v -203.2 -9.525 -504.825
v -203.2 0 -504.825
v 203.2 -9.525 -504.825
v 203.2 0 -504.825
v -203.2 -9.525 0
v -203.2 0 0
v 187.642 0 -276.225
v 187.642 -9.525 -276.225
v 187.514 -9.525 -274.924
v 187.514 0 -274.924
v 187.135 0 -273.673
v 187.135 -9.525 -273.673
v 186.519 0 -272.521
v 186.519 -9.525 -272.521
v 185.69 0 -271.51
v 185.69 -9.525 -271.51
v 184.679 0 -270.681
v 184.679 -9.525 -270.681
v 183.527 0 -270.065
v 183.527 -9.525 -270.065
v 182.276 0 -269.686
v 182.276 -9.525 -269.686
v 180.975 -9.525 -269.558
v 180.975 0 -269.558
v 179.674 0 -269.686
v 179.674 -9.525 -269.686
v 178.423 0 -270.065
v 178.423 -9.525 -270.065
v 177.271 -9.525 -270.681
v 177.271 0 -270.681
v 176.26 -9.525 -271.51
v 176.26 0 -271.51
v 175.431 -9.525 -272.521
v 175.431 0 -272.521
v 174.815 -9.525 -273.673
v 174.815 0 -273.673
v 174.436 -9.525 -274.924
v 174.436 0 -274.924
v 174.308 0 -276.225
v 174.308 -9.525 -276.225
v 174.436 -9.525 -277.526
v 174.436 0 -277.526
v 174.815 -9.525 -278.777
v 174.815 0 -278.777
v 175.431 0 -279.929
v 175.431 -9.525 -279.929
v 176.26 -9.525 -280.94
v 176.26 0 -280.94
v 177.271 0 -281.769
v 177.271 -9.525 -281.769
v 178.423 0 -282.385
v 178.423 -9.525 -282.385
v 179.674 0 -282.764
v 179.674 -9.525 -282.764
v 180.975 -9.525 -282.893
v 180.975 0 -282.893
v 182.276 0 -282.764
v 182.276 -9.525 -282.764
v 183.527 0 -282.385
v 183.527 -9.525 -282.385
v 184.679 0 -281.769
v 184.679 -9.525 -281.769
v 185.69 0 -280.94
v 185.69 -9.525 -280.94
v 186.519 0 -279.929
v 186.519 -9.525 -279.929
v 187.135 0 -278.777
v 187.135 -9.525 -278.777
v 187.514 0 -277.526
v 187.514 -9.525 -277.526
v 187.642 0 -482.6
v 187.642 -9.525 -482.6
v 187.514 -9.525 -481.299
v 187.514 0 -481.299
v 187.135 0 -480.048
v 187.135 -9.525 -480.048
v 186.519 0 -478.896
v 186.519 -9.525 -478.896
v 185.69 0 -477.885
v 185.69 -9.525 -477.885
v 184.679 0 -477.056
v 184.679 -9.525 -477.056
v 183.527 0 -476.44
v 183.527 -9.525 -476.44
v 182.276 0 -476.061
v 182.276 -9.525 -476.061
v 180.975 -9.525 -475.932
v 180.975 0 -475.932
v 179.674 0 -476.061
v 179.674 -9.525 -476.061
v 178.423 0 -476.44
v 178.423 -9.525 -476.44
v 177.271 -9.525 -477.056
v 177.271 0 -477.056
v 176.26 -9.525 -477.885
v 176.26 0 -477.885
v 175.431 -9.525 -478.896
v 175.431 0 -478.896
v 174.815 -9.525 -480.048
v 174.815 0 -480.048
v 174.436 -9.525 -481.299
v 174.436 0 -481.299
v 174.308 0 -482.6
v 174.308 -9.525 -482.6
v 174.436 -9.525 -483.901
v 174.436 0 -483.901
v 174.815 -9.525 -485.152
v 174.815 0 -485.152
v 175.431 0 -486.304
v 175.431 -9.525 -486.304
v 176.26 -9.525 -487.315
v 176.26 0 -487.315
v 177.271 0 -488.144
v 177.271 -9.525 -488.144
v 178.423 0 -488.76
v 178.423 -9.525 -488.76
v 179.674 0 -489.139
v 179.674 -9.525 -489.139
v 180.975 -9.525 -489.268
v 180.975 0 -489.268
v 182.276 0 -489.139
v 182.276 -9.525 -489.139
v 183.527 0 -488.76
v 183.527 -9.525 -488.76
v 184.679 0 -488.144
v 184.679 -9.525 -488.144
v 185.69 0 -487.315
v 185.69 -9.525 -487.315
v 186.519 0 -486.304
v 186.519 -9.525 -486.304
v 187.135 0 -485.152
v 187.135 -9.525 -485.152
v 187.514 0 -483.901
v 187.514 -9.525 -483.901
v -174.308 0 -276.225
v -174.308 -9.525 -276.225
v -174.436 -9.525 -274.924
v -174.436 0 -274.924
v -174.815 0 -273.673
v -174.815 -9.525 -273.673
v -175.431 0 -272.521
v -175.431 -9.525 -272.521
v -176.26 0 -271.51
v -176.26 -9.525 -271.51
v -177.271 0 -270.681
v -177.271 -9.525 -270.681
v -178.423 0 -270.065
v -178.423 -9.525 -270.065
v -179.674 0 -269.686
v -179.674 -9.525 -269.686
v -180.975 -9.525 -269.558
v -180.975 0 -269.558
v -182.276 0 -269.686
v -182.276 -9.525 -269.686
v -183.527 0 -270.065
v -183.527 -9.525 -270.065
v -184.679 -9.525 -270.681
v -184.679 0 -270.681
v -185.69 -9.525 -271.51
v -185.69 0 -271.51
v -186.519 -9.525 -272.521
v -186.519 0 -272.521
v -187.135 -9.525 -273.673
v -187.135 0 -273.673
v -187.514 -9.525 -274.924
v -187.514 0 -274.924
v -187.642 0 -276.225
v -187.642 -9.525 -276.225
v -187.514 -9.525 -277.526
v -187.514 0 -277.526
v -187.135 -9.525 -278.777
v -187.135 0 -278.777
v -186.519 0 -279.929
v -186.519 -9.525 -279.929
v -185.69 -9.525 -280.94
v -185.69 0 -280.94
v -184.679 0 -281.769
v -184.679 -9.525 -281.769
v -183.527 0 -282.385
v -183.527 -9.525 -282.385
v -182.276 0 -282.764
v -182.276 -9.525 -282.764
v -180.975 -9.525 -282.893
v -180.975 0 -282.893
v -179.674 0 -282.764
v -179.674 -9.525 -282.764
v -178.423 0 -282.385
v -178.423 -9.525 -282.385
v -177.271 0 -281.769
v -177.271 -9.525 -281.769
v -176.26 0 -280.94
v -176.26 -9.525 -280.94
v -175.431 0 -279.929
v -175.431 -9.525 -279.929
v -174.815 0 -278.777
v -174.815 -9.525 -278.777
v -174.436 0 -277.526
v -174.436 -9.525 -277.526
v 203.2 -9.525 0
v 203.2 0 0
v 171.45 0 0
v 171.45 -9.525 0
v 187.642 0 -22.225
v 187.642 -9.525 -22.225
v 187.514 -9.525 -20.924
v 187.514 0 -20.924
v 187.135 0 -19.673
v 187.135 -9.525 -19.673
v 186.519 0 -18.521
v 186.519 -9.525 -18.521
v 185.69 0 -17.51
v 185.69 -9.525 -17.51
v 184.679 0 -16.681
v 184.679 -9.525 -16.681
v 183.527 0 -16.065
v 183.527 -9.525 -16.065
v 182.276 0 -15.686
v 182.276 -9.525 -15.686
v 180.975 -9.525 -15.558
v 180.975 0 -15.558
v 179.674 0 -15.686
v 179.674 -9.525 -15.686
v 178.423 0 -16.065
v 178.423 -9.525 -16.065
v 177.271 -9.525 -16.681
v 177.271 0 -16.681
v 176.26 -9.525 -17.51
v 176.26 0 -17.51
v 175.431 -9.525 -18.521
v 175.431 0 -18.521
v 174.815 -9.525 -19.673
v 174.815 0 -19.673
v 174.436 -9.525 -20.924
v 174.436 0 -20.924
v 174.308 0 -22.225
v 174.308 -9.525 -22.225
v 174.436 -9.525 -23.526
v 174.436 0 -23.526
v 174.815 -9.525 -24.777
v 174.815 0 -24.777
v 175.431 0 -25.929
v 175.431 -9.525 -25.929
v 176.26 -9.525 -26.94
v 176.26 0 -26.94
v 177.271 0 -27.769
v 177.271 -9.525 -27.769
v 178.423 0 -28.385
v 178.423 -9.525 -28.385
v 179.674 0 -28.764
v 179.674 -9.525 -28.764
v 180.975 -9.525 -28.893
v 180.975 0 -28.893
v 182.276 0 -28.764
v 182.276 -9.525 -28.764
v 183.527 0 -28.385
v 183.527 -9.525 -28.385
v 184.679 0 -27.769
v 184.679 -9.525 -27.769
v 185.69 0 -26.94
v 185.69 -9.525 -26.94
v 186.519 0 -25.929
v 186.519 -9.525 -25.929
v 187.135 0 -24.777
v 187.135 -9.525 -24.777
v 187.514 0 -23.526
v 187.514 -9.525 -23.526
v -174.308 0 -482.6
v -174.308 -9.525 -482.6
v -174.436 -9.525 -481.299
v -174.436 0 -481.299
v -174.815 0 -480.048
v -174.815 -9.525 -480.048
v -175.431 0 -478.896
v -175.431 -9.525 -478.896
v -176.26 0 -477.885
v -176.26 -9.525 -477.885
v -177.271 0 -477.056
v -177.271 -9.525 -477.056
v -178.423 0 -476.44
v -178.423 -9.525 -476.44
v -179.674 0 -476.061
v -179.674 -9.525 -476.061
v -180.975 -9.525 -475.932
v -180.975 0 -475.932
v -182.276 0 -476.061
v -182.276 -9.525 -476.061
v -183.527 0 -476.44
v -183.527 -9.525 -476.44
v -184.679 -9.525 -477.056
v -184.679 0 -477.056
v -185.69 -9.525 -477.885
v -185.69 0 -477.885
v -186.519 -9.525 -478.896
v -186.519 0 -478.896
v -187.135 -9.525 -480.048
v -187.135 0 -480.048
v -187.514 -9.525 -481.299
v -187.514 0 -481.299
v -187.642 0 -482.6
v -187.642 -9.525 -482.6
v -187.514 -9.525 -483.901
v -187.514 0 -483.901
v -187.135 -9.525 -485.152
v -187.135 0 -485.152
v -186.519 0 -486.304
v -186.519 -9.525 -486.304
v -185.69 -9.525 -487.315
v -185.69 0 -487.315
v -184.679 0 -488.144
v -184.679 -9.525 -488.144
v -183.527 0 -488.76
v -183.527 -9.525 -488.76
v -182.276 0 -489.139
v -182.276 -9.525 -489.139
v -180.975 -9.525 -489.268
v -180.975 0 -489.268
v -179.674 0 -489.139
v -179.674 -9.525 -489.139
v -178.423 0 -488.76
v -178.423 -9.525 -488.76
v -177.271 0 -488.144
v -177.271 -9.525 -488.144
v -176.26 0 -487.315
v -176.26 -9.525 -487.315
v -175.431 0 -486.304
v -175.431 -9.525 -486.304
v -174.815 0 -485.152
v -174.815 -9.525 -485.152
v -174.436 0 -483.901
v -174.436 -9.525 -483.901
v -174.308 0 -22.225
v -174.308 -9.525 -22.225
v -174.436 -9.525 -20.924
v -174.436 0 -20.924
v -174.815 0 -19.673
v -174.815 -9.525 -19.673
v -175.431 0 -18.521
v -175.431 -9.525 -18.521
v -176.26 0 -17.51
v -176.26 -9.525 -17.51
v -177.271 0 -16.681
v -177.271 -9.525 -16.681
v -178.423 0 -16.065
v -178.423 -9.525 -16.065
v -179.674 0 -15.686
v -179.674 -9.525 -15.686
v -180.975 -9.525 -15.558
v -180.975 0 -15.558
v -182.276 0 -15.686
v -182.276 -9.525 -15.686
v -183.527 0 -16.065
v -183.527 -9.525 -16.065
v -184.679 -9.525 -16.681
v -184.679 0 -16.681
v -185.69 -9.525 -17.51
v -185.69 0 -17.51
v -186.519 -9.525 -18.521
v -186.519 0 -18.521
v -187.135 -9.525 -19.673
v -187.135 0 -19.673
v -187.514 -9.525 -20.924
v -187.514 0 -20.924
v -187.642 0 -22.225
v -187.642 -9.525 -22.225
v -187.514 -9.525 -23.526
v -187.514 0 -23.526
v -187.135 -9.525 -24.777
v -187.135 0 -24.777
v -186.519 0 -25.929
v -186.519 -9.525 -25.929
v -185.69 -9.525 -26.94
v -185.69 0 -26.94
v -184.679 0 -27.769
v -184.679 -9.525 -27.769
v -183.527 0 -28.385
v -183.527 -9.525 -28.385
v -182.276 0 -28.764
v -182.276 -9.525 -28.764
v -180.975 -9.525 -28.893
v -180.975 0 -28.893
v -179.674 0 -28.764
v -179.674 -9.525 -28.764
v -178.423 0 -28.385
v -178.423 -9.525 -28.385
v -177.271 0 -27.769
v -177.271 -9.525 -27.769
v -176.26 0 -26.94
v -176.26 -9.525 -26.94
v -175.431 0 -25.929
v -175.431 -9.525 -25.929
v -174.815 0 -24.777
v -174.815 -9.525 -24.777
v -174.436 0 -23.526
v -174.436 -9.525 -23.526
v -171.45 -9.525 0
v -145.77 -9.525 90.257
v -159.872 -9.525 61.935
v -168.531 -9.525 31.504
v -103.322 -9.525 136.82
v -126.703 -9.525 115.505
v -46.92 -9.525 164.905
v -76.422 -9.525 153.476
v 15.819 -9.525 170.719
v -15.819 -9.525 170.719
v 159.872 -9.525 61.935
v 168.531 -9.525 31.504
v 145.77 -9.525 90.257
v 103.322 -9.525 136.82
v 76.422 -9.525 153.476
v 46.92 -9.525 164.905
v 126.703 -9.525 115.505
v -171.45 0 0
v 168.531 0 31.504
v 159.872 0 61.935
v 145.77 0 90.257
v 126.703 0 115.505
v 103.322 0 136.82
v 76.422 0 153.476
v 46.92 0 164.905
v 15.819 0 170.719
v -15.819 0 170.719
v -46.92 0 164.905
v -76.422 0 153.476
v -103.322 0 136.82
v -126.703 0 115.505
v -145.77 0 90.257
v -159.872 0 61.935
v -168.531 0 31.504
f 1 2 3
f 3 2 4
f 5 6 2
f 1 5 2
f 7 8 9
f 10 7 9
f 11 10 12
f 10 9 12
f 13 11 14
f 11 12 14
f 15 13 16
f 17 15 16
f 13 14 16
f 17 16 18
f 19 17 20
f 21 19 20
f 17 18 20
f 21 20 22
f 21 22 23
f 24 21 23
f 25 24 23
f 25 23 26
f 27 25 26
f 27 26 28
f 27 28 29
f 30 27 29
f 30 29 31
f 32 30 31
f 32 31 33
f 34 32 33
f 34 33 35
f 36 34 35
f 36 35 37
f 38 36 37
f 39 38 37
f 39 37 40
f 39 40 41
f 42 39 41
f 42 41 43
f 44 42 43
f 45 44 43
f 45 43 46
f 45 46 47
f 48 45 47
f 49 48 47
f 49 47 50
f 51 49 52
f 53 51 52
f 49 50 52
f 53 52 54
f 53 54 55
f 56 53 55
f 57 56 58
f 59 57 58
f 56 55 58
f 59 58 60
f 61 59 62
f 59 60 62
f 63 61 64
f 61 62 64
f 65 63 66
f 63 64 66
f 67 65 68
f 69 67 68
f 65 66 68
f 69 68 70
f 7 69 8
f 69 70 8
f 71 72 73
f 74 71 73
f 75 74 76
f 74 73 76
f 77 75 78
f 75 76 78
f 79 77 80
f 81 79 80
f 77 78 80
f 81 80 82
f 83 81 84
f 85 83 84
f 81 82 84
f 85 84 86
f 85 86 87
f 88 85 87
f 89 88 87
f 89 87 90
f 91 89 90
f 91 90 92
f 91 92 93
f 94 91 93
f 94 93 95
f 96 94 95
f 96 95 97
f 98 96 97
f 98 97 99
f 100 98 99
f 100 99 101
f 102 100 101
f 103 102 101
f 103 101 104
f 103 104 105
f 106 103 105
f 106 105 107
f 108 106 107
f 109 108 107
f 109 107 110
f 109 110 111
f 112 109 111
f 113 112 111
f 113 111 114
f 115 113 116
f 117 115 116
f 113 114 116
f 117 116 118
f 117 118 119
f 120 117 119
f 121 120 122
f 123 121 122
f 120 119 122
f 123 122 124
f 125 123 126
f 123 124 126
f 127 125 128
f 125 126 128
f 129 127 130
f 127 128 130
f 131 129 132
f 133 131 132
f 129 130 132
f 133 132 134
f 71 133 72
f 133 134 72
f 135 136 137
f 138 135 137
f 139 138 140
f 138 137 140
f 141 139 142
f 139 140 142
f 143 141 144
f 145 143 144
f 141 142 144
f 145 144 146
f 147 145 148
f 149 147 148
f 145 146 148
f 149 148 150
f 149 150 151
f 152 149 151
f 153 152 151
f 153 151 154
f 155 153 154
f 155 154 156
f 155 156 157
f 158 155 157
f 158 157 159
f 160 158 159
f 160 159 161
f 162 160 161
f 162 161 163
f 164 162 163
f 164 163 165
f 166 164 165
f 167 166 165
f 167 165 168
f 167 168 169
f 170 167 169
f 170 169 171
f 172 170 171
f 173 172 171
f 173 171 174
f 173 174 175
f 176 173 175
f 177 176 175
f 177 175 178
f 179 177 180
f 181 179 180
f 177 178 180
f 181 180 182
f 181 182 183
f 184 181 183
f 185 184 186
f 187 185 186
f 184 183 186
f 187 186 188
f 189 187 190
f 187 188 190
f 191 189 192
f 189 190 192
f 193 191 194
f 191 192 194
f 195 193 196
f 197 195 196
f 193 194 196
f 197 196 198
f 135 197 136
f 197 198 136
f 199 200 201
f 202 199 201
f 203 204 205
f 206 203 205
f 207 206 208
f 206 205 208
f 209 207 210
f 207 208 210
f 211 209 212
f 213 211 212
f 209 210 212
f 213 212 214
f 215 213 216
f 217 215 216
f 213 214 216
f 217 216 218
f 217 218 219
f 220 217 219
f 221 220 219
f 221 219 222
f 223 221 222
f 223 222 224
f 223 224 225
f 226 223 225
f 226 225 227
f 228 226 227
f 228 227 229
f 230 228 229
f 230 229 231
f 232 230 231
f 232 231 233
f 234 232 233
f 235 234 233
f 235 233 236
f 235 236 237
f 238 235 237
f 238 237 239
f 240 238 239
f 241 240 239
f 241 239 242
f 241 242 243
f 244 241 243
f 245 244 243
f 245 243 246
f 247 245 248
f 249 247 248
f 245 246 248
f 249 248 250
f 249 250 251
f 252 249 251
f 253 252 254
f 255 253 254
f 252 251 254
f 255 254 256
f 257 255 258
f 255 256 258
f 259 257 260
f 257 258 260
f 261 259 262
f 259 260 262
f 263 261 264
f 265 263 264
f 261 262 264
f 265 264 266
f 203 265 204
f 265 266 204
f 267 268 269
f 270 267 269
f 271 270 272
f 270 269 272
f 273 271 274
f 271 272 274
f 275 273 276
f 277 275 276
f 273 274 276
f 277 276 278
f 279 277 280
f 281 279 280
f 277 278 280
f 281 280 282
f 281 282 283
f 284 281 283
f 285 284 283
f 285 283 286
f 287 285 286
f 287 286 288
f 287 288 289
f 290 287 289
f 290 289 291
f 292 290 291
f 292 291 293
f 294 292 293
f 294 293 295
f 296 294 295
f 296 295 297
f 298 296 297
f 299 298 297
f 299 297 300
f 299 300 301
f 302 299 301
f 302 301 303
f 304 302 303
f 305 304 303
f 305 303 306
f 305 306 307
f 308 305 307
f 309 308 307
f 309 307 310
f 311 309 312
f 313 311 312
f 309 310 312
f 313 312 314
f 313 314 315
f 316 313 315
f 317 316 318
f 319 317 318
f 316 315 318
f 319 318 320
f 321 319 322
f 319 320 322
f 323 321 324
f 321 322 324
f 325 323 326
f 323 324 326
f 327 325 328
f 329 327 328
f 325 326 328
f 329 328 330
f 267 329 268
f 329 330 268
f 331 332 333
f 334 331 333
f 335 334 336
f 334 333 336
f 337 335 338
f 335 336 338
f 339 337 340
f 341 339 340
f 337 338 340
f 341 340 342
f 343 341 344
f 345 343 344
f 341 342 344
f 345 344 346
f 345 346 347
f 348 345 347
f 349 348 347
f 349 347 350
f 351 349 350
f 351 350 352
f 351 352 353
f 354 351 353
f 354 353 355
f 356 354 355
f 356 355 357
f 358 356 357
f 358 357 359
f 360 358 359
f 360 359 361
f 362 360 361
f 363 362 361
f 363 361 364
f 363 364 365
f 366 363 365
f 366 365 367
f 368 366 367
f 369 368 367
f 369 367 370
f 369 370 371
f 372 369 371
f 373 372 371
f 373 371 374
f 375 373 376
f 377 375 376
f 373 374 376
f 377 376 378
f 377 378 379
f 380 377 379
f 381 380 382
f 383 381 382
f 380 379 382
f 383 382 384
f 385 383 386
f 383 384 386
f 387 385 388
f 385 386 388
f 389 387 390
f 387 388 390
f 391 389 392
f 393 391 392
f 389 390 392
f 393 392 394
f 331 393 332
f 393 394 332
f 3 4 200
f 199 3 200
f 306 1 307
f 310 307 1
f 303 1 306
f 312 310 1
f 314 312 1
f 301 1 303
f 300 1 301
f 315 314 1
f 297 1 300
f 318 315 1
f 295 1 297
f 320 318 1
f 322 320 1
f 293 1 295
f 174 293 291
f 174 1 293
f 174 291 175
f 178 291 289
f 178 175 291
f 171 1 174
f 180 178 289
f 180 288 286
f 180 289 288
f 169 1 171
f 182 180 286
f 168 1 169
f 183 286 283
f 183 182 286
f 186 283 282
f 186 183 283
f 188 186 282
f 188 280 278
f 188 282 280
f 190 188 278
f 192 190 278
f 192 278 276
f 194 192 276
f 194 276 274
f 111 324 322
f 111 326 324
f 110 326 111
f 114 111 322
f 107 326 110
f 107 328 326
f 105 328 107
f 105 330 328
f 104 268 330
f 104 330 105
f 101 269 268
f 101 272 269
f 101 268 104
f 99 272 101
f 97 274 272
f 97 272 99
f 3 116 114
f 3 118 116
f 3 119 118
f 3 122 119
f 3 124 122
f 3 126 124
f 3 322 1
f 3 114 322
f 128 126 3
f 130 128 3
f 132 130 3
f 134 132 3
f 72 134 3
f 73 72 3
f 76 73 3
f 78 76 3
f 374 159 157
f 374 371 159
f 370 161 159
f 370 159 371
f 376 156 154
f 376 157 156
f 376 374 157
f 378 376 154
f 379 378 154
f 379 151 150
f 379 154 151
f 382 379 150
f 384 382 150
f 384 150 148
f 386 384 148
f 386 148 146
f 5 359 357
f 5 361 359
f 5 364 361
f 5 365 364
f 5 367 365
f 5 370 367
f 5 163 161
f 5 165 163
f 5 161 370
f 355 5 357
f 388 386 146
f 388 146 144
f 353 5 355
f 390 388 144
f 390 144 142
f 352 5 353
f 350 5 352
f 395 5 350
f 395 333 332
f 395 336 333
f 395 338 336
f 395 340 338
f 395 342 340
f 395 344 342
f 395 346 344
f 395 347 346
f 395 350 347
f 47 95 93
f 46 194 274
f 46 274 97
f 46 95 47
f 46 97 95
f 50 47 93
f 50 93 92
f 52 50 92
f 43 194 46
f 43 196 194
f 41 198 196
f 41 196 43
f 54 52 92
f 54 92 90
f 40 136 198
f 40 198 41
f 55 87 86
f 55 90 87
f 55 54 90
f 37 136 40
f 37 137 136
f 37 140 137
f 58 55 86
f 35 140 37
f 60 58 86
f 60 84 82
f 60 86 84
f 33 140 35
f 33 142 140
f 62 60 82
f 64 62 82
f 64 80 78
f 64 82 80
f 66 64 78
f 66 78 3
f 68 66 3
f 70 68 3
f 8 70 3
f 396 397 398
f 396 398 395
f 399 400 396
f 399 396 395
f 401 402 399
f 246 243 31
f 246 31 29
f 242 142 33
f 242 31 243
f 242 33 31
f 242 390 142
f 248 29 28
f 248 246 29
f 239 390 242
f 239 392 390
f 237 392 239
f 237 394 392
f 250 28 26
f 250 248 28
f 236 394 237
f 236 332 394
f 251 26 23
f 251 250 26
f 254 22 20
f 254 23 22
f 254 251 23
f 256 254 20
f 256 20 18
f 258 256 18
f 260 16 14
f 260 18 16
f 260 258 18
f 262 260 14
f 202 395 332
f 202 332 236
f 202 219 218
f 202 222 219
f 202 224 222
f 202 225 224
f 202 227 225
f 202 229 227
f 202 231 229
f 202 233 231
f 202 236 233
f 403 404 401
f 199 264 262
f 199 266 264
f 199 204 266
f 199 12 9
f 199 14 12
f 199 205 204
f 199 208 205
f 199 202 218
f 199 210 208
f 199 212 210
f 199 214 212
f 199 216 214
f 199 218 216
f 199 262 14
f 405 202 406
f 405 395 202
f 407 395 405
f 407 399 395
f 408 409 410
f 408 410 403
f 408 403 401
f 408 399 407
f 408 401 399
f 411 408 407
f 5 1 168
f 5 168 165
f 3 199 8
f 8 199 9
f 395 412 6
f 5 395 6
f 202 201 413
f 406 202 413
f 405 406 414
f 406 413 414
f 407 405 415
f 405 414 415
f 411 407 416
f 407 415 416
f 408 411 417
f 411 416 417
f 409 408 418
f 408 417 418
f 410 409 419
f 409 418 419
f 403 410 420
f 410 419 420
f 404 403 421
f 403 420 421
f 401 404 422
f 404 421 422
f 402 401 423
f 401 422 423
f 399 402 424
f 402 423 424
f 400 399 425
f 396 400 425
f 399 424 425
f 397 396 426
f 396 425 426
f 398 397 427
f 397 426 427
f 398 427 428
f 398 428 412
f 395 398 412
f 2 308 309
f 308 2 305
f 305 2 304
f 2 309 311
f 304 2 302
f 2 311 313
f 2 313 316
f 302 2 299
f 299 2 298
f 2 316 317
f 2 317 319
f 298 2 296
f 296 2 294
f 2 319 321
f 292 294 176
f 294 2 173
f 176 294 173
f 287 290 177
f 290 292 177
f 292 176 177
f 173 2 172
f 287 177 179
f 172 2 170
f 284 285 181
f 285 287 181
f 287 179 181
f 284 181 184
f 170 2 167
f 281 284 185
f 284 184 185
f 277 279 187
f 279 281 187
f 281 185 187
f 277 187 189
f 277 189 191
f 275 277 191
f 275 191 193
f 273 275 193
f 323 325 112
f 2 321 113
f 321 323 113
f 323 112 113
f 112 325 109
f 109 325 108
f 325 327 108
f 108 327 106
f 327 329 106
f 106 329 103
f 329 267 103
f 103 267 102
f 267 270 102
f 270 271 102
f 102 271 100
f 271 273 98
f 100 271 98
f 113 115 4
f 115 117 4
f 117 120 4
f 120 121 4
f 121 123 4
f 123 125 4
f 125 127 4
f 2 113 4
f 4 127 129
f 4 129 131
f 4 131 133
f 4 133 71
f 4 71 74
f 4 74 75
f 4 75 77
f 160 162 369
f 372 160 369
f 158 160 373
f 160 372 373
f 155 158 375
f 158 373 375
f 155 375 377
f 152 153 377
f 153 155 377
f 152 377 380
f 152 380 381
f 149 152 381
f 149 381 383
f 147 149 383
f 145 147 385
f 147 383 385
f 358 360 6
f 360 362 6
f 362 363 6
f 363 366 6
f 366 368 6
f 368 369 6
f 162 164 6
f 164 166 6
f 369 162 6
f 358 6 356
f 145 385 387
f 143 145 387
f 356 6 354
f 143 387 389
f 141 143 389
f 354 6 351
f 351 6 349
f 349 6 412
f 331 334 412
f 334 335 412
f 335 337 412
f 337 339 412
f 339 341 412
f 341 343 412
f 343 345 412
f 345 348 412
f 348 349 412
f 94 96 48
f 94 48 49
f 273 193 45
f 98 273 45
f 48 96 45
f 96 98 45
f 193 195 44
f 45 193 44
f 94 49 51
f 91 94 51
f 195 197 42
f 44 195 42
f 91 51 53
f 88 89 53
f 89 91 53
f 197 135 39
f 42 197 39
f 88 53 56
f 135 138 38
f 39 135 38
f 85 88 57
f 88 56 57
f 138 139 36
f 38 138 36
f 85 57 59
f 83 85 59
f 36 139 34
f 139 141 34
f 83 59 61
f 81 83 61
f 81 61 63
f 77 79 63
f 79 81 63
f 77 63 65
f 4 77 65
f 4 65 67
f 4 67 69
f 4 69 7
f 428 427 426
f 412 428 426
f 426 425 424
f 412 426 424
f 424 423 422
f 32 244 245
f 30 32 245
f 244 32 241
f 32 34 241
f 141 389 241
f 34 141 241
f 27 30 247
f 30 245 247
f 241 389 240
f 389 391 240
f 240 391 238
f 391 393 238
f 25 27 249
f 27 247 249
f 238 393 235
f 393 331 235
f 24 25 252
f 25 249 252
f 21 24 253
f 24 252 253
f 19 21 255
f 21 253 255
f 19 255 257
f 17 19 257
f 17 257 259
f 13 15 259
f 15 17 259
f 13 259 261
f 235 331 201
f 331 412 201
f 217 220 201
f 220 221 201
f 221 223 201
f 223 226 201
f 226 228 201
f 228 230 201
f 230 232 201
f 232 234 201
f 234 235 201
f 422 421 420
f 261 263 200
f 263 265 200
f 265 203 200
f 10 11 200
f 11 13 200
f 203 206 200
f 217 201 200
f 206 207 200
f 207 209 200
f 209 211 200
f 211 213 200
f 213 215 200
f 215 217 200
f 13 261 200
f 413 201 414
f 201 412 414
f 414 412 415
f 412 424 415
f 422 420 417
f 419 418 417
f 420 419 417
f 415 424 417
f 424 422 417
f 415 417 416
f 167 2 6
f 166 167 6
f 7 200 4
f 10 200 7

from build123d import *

# Parameters (mm, degrees)
F1_DEPTH = 9.525
F2_R     = 6.6675
F3_DEPTH = 9.526


with BuildPart() as f1:
    # F0 (on Front) → F1 (new body)
    with BuildSketch(Plane.XZ):
        with BuildLine():
            Line((203.2, 0), (171.45, 0))
            ThreePointArc((171.45, 0), (0, 171.45), (-171.45, 0))
            Line((-171.45, 0), (-203.2, 0))
            Line((-203.2, 0), (-203.2, -504.825))
            Line((-203.2, -504.825), (203.2, -504.825))
            Line((203.2, -504.825), (203.2, 0))
        make_face()
    extrude(amount=F1_DEPTH)

    # F2 (on face) → F3 (cut, through all)
    with BuildSketch(Plane.XZ.offset(9.525)):
        with Locations((-180.975, -22.225)):
            Circle(F2_R)
        with Locations((180.975, -22.225)):
            Circle(F2_R)
        with Locations((180.975, -276.225)):
            Circle(F2_R)
        with Locations((-180.975, -276.225)):
            Circle(F2_R)
        with Locations((180.975, -482.6)):
            Circle(F2_R)
        with Locations((-180.975, -482.6)):
            Circle(F2_R)
    extrude(amount=-F3_DEPTH, mode=Mode.SUBTRACT)


solid = f1.part
